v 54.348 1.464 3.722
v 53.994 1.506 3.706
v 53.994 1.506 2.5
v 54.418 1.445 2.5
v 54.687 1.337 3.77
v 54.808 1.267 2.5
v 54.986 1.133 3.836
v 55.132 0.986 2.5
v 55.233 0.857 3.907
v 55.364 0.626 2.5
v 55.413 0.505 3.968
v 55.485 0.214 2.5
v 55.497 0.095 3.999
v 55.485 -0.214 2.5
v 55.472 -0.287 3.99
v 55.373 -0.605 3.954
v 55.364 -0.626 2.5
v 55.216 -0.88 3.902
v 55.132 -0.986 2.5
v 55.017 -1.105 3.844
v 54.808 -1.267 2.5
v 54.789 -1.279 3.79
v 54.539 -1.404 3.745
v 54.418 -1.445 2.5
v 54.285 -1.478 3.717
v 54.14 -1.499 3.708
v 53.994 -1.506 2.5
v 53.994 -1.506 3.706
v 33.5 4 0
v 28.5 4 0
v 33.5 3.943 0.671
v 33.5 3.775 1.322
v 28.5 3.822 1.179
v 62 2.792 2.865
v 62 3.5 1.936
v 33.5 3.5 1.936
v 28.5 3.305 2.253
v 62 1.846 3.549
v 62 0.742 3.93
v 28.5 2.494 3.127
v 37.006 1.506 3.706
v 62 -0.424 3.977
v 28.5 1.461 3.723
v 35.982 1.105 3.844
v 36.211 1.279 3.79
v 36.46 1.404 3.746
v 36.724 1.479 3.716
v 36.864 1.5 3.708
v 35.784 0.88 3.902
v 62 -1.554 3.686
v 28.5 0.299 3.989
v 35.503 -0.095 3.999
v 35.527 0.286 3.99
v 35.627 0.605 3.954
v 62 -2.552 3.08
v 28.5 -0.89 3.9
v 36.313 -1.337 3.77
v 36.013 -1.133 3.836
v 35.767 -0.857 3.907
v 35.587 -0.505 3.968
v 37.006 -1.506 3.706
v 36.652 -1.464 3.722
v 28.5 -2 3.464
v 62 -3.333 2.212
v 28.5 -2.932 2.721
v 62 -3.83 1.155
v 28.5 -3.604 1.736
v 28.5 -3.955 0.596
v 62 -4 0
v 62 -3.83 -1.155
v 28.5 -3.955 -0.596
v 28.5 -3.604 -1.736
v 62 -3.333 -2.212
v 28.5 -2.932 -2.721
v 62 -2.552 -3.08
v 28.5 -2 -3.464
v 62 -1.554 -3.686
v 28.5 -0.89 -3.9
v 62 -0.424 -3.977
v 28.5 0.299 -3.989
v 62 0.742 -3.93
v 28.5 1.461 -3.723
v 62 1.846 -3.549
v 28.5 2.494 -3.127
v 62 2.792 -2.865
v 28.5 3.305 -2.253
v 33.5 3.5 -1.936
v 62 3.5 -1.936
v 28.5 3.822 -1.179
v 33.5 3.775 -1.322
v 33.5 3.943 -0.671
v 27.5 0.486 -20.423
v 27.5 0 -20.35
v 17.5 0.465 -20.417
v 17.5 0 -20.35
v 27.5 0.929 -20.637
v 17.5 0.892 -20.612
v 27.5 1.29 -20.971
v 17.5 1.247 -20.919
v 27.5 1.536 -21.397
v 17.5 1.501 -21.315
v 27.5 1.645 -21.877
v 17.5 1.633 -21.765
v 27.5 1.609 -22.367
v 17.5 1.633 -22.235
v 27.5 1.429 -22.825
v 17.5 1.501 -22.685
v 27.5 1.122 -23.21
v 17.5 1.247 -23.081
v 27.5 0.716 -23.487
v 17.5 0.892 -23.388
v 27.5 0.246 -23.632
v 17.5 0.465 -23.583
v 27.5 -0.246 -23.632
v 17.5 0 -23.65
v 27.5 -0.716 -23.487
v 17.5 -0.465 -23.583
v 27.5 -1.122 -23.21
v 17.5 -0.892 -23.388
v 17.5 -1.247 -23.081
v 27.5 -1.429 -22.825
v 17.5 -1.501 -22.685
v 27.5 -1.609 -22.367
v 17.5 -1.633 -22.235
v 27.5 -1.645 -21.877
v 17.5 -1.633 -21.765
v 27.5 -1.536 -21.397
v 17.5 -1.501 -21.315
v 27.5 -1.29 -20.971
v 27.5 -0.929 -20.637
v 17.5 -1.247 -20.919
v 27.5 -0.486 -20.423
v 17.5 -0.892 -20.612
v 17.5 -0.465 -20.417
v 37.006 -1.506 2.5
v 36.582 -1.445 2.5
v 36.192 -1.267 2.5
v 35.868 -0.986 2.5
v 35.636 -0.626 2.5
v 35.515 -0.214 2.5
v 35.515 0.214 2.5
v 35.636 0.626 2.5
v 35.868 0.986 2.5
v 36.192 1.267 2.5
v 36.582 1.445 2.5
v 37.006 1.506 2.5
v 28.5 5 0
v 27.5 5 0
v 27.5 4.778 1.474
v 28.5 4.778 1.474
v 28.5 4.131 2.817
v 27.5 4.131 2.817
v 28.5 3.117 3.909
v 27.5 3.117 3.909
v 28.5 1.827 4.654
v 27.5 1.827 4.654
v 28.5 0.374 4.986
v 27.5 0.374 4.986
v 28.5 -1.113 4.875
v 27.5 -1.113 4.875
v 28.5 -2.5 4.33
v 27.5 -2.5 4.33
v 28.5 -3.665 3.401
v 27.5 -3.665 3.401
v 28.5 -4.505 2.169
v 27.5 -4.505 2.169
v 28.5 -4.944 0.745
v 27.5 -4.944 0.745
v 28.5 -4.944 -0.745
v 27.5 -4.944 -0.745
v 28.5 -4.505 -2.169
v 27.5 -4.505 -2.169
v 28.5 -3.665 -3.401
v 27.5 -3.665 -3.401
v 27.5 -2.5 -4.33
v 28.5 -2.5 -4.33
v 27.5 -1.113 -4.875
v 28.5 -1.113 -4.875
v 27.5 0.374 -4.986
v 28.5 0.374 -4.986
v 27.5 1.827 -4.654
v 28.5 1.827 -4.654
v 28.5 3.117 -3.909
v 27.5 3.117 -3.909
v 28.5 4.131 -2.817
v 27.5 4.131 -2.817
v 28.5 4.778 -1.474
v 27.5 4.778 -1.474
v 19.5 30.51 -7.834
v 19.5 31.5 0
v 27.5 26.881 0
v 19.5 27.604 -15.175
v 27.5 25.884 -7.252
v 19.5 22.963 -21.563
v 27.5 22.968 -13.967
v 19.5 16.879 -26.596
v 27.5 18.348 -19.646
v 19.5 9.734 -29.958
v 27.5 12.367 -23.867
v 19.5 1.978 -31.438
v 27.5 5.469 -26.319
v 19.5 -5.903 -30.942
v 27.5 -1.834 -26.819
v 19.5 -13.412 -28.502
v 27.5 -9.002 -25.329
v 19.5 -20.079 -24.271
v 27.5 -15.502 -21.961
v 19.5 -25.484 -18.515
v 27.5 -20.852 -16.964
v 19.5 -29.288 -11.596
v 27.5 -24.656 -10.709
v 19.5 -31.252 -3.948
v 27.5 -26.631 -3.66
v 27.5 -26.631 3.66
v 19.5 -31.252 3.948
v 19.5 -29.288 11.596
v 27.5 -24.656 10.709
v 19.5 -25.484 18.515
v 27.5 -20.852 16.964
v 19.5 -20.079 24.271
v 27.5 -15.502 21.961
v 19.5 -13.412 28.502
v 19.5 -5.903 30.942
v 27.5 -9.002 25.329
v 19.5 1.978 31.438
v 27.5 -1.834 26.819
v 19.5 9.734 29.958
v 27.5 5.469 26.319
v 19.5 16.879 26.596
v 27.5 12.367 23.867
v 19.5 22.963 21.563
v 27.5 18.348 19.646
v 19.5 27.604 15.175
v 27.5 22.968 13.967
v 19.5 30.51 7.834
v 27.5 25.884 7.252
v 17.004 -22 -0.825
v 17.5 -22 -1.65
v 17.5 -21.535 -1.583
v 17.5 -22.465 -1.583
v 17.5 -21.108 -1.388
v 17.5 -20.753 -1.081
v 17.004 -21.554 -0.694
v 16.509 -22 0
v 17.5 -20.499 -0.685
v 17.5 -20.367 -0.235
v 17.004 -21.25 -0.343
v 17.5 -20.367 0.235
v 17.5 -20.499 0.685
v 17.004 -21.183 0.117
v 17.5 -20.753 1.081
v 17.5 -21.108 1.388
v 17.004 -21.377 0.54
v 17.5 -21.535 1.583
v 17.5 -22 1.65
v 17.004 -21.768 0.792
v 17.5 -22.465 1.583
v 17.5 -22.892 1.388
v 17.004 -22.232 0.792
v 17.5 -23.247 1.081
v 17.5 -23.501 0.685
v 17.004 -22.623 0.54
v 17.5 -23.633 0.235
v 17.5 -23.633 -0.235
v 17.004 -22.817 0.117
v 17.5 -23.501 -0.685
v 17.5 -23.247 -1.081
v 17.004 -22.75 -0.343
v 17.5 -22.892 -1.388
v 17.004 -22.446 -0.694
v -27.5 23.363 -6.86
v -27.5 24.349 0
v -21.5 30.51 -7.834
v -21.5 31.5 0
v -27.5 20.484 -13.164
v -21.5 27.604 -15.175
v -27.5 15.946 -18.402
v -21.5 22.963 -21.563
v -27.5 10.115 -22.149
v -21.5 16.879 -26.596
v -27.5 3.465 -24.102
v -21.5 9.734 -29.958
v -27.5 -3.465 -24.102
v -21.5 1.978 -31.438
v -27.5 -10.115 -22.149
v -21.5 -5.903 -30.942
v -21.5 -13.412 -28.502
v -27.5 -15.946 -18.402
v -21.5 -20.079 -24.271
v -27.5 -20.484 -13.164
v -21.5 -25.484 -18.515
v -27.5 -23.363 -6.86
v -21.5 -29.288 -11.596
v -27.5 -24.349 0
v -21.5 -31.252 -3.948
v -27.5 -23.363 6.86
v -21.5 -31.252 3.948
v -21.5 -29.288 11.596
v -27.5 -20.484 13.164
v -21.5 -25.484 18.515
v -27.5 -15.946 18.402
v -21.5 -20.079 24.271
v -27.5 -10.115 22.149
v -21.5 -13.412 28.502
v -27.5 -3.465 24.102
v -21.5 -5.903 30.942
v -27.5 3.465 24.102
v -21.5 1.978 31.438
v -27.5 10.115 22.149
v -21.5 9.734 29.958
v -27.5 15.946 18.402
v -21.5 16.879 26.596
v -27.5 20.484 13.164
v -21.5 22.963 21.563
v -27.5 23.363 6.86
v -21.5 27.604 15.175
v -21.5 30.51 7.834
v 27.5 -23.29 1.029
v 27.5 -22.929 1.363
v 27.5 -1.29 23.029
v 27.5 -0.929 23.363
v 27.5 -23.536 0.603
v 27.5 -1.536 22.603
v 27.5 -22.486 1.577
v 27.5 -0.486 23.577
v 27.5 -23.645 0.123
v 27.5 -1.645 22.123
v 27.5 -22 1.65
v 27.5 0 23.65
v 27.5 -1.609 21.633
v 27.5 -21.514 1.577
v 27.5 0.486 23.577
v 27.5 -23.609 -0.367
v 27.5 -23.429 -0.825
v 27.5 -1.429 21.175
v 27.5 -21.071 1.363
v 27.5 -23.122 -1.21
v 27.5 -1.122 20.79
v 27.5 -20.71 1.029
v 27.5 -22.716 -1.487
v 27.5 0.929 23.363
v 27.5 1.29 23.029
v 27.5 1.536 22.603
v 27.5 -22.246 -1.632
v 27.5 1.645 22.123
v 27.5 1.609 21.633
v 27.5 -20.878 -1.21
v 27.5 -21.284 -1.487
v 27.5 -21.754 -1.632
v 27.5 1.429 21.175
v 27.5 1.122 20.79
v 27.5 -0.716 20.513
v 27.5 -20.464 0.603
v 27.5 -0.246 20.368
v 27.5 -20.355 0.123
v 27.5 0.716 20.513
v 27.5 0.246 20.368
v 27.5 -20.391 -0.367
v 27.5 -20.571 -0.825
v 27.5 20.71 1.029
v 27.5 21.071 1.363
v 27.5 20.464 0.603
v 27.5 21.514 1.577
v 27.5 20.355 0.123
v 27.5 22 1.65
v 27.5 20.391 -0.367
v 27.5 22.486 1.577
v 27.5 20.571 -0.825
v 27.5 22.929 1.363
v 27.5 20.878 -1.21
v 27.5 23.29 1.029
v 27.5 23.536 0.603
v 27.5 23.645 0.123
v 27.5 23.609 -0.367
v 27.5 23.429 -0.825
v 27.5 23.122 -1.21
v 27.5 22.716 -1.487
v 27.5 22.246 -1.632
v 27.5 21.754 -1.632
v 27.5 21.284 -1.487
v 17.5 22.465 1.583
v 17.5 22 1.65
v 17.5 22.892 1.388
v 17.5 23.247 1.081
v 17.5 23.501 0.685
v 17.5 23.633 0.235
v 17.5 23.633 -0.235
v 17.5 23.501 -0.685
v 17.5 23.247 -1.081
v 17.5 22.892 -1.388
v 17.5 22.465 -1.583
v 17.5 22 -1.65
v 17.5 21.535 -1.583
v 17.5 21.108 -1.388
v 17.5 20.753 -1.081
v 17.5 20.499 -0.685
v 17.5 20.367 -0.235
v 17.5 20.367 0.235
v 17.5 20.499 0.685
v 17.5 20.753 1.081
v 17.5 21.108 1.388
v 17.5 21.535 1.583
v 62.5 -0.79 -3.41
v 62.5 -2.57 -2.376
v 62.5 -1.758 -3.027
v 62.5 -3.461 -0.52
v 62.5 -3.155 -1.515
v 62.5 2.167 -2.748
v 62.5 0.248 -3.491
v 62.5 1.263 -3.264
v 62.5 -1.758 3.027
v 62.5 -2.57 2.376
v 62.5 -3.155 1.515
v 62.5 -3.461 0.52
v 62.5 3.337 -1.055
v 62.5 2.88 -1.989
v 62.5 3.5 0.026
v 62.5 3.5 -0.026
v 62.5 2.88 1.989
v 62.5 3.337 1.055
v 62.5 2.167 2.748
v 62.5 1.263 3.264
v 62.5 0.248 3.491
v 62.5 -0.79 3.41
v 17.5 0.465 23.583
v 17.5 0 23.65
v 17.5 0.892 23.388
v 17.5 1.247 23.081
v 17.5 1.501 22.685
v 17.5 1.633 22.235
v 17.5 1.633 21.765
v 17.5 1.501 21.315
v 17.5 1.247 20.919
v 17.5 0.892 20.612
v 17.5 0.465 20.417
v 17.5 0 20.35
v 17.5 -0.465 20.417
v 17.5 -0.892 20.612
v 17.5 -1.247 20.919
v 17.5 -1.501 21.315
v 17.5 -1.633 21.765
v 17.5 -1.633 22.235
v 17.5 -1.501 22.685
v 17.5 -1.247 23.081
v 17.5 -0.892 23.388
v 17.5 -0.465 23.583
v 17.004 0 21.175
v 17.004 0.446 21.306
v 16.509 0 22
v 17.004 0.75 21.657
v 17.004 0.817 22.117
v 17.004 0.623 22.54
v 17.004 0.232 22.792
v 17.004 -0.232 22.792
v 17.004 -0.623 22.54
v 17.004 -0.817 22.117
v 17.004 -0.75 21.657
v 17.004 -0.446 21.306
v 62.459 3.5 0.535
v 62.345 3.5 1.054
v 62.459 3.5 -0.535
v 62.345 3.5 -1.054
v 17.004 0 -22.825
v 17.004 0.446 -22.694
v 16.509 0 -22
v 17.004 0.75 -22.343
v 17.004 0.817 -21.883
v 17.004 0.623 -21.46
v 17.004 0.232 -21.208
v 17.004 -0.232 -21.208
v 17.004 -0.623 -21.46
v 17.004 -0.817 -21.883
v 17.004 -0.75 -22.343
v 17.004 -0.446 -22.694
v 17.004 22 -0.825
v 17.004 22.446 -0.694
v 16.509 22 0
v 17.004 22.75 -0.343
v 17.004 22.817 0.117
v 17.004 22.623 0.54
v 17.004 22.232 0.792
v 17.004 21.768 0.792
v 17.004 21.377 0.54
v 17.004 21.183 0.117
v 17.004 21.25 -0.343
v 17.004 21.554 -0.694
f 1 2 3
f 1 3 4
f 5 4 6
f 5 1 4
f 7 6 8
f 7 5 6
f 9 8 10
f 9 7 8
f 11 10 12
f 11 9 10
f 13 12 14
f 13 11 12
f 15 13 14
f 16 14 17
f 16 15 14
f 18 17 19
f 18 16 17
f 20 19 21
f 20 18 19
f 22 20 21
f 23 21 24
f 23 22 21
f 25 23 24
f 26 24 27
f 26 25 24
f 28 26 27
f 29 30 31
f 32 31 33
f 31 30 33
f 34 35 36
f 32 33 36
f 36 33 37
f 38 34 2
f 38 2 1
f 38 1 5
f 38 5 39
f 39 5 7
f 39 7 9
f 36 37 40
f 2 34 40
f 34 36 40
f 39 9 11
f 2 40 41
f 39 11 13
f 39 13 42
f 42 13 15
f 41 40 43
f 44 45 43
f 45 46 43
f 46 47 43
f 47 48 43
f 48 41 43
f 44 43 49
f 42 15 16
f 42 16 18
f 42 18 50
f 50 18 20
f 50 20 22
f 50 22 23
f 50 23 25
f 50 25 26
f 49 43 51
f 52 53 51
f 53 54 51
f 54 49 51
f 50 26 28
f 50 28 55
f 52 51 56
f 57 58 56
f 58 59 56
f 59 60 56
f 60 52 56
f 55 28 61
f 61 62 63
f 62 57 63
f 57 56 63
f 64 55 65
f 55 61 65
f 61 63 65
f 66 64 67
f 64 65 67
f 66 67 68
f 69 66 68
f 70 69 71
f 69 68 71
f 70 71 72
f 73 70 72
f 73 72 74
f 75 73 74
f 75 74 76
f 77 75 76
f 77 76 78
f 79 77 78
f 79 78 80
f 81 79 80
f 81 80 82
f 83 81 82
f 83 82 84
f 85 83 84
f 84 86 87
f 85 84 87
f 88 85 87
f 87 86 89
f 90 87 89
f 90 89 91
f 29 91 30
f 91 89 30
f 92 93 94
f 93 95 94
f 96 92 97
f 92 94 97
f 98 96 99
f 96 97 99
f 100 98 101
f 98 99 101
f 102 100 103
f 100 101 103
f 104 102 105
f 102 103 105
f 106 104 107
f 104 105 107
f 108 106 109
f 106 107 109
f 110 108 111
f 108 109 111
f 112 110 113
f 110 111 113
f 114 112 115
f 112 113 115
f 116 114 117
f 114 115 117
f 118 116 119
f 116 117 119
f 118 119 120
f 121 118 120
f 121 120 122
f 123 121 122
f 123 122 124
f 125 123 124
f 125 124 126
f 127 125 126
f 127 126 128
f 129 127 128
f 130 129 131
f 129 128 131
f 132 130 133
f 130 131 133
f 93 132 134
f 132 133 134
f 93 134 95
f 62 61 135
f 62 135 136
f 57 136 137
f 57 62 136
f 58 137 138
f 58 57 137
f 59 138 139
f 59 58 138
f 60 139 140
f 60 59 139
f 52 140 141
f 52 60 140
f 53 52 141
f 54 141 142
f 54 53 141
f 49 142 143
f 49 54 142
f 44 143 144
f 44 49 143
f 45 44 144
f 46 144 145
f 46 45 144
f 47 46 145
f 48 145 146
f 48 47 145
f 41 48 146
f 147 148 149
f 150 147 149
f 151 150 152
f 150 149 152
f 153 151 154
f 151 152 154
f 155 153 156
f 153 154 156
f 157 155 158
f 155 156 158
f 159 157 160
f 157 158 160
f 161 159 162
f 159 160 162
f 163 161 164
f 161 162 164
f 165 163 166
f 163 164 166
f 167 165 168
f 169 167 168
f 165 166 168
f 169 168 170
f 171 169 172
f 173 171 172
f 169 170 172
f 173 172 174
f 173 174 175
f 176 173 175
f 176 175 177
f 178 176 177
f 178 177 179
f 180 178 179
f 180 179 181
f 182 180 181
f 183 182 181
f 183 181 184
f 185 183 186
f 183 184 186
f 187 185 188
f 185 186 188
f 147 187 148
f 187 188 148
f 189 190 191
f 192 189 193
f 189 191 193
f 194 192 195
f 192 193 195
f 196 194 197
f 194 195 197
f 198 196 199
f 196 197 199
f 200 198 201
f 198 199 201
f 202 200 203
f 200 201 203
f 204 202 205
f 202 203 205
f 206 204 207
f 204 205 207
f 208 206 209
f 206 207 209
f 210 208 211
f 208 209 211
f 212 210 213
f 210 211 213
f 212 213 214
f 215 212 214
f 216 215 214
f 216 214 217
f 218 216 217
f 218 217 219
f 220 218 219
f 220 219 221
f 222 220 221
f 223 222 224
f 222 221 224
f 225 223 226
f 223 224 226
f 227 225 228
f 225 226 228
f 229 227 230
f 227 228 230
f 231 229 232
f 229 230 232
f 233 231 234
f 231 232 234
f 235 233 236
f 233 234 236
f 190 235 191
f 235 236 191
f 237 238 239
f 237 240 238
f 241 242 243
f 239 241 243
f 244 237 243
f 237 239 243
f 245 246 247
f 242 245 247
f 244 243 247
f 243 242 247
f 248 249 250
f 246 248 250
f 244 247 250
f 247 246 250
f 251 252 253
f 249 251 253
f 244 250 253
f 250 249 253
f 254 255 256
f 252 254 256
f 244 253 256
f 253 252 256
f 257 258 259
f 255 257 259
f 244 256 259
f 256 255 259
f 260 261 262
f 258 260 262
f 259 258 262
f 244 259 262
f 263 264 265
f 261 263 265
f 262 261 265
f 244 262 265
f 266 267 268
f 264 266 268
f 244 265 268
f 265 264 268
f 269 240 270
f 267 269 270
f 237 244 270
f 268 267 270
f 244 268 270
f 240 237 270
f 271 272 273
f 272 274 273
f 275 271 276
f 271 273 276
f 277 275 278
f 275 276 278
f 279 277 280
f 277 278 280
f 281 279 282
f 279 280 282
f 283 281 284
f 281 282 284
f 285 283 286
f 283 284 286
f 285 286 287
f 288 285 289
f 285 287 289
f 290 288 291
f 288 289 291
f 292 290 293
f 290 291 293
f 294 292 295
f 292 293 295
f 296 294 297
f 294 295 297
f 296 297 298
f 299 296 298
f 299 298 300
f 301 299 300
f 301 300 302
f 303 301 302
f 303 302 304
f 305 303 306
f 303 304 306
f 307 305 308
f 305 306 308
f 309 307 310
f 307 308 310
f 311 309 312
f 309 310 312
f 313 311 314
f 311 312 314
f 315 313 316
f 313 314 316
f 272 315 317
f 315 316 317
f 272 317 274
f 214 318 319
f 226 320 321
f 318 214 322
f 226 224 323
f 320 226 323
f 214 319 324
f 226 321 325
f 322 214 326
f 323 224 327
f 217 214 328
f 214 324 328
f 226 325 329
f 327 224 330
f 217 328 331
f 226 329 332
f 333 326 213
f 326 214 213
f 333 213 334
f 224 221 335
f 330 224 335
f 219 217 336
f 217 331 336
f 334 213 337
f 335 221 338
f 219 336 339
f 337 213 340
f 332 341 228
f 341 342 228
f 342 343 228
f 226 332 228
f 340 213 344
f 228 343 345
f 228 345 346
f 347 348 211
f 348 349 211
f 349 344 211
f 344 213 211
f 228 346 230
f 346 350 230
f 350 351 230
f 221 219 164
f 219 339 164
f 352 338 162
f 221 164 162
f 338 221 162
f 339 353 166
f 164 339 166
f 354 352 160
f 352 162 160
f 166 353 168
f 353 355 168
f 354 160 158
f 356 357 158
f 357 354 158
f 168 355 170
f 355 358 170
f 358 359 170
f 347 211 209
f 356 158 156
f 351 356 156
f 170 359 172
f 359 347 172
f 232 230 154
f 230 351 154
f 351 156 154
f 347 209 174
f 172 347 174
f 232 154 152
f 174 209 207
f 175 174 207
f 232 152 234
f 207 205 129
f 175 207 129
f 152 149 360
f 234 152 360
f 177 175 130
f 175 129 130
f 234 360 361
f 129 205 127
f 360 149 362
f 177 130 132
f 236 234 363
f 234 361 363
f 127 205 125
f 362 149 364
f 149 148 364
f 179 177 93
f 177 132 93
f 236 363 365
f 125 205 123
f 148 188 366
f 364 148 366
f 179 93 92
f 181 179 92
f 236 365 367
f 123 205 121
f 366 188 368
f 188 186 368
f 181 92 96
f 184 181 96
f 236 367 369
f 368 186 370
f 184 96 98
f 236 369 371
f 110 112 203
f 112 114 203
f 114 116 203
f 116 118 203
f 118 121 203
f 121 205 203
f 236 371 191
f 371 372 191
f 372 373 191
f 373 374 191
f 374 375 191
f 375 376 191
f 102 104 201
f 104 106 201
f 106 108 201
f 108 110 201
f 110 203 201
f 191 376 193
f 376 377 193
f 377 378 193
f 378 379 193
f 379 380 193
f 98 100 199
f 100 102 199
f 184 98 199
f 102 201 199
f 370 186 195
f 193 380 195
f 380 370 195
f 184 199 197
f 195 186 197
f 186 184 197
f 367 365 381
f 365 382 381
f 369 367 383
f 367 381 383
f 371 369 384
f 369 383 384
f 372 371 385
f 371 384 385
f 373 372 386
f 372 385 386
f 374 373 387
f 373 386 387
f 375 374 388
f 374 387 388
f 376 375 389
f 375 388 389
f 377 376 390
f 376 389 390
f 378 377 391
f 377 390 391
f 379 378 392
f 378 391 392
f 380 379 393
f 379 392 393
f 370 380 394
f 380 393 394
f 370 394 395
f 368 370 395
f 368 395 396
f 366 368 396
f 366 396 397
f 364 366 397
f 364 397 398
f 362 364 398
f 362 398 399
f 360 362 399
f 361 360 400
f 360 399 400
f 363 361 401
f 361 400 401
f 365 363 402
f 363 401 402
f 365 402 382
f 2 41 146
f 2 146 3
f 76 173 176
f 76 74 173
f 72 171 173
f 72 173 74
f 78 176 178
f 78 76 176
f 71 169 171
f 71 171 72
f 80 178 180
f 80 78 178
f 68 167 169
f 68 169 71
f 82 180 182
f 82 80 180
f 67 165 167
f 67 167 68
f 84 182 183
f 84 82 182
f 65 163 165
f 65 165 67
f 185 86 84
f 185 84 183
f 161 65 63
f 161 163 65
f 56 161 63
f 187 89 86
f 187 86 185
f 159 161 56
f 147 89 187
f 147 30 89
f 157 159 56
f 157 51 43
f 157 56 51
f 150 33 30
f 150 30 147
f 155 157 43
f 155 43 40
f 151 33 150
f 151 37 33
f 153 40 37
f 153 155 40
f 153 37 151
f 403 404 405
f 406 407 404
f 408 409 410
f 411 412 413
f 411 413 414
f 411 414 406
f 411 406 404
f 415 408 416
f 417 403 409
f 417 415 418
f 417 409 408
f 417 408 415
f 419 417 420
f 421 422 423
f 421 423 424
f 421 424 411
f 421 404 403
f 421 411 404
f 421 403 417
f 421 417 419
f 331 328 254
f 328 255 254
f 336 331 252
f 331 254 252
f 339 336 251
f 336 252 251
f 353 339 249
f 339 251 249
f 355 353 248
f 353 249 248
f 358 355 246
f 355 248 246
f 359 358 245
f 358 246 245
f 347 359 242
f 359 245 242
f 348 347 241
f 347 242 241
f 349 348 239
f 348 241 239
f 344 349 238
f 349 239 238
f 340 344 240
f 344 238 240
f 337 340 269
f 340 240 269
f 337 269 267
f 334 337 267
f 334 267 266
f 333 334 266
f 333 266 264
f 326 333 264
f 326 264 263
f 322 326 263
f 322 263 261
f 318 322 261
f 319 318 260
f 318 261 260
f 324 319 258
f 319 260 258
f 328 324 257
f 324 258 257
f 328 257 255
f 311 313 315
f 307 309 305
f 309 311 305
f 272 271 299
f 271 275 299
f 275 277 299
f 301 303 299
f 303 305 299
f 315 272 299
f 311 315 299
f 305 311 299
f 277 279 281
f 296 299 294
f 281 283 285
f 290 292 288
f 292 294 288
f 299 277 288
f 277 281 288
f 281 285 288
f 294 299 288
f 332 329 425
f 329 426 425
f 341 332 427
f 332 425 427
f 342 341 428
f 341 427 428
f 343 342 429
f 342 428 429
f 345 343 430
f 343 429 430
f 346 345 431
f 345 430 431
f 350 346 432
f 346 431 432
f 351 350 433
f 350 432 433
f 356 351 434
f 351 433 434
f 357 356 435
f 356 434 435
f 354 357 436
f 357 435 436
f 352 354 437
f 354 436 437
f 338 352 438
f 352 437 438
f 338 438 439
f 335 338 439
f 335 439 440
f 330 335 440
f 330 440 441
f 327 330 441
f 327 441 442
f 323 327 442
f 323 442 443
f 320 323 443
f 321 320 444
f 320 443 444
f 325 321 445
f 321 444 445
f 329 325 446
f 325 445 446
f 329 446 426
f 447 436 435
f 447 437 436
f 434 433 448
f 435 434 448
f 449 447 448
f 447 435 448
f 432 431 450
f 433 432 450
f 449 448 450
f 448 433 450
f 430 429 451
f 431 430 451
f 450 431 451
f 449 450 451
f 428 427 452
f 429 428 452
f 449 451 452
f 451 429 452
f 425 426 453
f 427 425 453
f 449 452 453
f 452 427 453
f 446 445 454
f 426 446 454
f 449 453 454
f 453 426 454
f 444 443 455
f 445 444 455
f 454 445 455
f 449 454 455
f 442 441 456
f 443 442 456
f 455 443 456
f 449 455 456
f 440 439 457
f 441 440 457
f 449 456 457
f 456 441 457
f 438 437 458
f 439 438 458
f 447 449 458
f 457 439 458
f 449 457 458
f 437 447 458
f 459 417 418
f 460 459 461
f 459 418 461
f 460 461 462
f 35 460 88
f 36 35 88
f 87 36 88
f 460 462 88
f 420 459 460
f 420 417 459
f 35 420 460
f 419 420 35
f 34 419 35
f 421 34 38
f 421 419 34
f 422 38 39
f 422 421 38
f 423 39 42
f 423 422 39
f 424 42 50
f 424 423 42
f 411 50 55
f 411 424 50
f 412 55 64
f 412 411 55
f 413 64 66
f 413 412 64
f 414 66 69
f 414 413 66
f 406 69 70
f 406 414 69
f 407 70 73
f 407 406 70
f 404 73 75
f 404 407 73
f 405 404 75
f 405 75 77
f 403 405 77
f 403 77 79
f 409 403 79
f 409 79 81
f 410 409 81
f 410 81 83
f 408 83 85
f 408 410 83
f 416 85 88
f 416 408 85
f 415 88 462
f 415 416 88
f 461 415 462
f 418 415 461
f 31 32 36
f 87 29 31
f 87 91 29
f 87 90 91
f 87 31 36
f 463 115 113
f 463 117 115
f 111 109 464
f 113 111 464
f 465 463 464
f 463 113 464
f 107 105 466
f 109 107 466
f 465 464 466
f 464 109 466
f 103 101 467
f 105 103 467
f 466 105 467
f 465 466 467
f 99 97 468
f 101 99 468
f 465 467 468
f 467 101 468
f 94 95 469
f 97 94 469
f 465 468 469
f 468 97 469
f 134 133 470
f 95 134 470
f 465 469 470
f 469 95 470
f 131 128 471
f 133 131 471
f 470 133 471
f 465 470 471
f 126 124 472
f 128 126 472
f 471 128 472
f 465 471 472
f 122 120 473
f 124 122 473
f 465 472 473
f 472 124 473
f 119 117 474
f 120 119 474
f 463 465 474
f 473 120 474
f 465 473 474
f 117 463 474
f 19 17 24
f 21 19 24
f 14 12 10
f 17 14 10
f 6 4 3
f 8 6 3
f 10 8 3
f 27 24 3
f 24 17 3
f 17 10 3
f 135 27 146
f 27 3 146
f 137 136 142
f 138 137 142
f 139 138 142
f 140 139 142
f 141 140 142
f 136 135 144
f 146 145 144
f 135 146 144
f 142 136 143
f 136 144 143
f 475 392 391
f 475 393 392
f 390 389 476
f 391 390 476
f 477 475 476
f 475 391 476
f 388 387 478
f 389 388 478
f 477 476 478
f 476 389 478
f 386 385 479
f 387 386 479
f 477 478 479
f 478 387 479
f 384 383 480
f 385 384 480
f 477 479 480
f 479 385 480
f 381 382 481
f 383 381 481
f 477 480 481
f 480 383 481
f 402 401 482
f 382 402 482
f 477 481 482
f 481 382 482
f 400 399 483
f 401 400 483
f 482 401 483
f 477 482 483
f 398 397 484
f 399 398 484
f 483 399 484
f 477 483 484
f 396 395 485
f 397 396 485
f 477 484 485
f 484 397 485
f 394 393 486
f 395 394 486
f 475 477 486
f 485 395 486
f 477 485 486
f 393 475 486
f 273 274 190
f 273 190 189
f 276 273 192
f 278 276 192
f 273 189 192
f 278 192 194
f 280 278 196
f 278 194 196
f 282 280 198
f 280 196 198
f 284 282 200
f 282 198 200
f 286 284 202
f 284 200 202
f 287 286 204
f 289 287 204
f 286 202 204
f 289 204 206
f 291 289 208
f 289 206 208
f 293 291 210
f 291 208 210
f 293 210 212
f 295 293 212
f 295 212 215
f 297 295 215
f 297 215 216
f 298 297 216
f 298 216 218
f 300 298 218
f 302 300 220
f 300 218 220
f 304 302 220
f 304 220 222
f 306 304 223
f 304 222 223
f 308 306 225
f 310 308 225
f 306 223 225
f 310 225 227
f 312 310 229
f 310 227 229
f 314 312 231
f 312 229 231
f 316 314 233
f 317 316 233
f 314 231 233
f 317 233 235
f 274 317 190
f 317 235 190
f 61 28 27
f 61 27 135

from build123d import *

# Parameters (mm, degrees)
SKIZZE2_R                       = 5
SKIZZE2_R_2                     = 4
AUFSATZ_LINEAR_AUSTRAGEN1_DEPTH = 1
SKIZZE2_2_R                     = 4
AUFSATZ_LINEAR_AUSTRAGEN2_DEPTH = 35
M4_GEWINDEBOHRUNG1_D            = 3.3
M4_GEWINDEBOHRUNG1_DEPTH        = 10
M4_GEWINDEBOHRUNG1_TIP          = 0.991420021
SCHNITT_LINEAR_AUSTRAGEN1_DEPTH = 1.5
SKIZZE7_W                       = 8
SKIZZE7_H                       = 3.641356754
SCHNITT_LINEAR_AUSTRAGEN2_DEPTH = 29
FASE1_SIZE                      = 0.5


with BuildPart() as part:
    # Skizze1 → Rotation1 (revolve)
    with BuildSketch(Plane.XY):
        Polygon((27.5, 0), (-27.5, 0), (-27.5, 24.349478444), (-21.5, 31.5), (19.5, 31.5), (27.5, 26.881197846), align=None)
    revolve(axis=Axis((27.5, 0, 0), (-1, 0, 0)))

    # Skizze2 → Aufsatz-Linear austragen1 (add)
    with BuildSketch(Plane(origin=(27.5, 0, 0), x_dir=(0, 0, -1), z_dir=(1, 0, 0))):
        with Locations(Location((0, 0, 0), (0, 0, 90))):
            Circle(SKIZZE2_R)
        with Locations(Location((0, 0, 0), (0, 0, 90))):
            Circle(SKIZZE2_R_2, mode=Mode.SUBTRACT)
    extrude(amount=AUFSATZ_LINEAR_AUSTRAGEN1_DEPTH)

    # Skizze2<2> → Aufsatz-Linear austragen2 (add)
    with BuildSketch(Plane(origin=(27.5, 0, 0), x_dir=(0, 0, -1), z_dir=(1, 0, 0))):
        with Locations(Location((0, 0, 0), (0, 0, 90))):
            Circle(SKIZZE2_2_R)
    extrude(amount=AUFSATZ_LINEAR_AUSTRAGEN2_DEPTH)

    # M4 Gewindebohrung1
    with Locations(Plane(origin=(27.5, 0, 0), x_dir=(0, 0, -1), z_dir=(1, 0, 0))):
        with Locations((0, 22), (0, -22), (22, 0), (-22, 0)):
            Hole(M4_GEWINDEBOHRUNG1_D / 2, depth=M4_GEWINDEBOHRUNG1_DEPTH)
            with Locations((0, 0, -(M4_GEWINDEBOHRUNG1_DEPTH + M4_GEWINDEBOHRUNG1_TIP / 2))):  # 118° drill point
                Cone(0, M4_GEWINDEBOHRUNG1_D / 2, M4_GEWINDEBOHRUNG1_TIP, mode=Mode.SUBTRACT)

    # Skizze6 → Schnitt-Linear austragen1 (cut)
    with BuildSketch(Plane.XY.offset(4)):
        with BuildLine():
            Line((37.00625, 1.50625), (53.99375, 1.50625))
            ThreePointArc((53.99375, 1.50625), (55.5, 0), (53.99375, -1.50625))
            Line((53.99375, -1.50625), (37.00625, -1.50625))
            ThreePointArc((37.00625, -1.50625), (35.5, 0), (37.00625, 1.50625))
        make_face()
    extrude(amount=-SCHNITT_LINEAR_AUSTRAGEN1_DEPTH, mode=Mode.SUBTRACT)

    # Skizze7 → Schnitt-Linear austragen2 (cut)
    with BuildSketch(Plane(origin=(62.5, 0, 0), x_dir=(0, 0, -1), z_dir=(1, 0, 0))):
        with Locations((0, 5.320678377)):
            Rectangle(SKIZZE7_W, SKIZZE7_H)
    extrude(amount=-SCHNITT_LINEAR_AUSTRAGEN2_DEPTH, mode=Mode.SUBTRACT)

    # Fase1
    fase1_edges = [part.edges().sort_by_distance(p)[0] for p in [
        (62.5, -4, 0),
    ]]
    chamfer(fase1_edges, length=FASE1_SIZE - 0.0001)  # a hair under: the kernel refuses the full size


solid = part.part
